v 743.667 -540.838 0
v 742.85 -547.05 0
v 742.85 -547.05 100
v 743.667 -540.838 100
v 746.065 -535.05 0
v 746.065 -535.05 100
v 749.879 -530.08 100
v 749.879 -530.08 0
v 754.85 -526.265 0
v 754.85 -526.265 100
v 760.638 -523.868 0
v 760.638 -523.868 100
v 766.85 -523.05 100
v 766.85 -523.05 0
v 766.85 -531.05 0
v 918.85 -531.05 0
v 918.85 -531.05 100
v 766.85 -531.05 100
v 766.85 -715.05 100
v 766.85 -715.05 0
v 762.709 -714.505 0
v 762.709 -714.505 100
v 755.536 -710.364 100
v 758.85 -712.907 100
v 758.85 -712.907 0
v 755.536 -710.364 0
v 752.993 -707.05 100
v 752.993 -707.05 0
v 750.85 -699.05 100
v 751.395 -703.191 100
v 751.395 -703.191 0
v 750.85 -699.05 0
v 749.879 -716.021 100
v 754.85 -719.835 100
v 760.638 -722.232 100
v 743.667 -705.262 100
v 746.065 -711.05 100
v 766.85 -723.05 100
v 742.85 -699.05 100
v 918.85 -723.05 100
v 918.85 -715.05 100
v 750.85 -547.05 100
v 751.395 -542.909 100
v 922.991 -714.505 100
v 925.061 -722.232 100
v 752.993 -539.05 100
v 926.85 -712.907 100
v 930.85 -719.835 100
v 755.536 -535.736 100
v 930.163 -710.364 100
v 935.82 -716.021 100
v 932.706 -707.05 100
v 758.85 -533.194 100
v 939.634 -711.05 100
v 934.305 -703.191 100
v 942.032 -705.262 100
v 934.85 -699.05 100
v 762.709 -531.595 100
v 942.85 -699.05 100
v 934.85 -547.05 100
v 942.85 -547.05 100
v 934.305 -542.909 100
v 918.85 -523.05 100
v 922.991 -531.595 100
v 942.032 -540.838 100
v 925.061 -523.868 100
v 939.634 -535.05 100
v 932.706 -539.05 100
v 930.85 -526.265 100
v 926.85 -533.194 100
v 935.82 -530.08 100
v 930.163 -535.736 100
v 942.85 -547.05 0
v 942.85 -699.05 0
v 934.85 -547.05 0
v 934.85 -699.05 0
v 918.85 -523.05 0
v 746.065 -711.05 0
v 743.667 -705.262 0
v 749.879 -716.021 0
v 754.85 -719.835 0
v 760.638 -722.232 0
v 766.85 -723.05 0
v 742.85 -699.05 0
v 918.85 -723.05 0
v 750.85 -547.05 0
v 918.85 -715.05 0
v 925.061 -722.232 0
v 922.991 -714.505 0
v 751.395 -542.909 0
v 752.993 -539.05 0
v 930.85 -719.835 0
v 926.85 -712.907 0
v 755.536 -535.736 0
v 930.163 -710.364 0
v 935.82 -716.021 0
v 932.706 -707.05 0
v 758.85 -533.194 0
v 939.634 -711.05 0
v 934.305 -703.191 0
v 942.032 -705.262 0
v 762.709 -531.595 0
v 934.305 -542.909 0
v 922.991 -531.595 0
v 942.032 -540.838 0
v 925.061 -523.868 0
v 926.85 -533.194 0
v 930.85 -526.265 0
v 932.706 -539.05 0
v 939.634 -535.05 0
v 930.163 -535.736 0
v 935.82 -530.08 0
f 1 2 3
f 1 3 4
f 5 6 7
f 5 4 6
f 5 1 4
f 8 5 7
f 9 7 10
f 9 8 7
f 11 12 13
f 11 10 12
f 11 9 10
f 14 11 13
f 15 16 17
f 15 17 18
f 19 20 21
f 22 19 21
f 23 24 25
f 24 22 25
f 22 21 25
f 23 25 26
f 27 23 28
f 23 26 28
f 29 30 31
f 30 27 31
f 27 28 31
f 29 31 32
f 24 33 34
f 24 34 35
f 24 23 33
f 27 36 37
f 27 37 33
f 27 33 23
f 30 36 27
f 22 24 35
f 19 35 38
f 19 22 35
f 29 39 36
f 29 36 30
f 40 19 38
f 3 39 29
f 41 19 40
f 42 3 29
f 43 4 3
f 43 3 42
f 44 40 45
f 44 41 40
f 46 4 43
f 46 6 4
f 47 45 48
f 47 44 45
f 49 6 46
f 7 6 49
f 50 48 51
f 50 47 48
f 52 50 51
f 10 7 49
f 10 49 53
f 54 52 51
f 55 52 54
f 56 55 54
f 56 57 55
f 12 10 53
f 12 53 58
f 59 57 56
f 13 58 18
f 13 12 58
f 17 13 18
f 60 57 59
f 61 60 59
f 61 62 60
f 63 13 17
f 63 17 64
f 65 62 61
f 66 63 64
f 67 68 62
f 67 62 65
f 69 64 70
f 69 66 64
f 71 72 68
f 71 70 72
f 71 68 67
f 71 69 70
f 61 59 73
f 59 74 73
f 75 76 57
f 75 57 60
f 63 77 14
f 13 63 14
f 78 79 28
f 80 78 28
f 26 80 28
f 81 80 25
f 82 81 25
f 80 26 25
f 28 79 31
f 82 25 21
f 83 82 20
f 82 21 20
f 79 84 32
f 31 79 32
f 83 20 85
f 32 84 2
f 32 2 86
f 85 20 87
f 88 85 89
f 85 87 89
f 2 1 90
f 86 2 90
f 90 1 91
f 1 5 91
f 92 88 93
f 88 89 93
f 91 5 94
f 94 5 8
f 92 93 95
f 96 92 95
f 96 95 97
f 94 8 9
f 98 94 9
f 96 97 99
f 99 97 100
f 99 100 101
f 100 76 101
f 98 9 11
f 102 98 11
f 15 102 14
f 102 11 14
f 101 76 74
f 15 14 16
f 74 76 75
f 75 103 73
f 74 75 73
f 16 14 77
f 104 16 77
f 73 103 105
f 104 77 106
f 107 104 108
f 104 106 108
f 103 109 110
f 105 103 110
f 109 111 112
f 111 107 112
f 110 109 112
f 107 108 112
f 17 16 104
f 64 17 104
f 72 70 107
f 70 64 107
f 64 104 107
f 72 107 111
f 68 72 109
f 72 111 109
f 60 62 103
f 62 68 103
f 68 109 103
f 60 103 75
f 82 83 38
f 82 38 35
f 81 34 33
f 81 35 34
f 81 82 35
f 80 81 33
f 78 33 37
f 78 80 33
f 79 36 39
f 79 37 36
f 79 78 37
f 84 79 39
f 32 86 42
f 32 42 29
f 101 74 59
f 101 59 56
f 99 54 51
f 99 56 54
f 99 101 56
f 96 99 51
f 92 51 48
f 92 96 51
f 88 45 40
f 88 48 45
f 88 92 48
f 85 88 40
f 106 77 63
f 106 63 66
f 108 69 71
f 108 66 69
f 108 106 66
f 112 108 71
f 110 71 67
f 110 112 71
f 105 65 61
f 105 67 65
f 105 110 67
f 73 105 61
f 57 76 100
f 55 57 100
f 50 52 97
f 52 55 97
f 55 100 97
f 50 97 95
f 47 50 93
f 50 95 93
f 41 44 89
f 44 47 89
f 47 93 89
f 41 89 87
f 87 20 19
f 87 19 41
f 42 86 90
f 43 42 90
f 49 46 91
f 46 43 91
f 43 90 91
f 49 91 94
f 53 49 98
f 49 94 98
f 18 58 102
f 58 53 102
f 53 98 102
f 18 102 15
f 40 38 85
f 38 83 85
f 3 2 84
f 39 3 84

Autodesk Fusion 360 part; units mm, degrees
sketch "スケッチ1" plane through (0, 0, 0) normal (0, 0, 1) x (1, 0, 0)
  line L0 (942.8497, -699.0501) -> (942.8497, -547.0501)
  line L1 (934.8497, -699.0501) -> (934.8497, -547.0501)
  line L2 (742.8497, -547.0501) -> (742.8497, -699.0501)
  line L3 (750.8497, -547.0501) -> (750.8497, -699.0501)
  line L4 (766.8497, -723.0501) -> (918.8497, -723.0501)
  line L5 (766.8497, -715.0501) -> (918.8497, -715.0501)
  arc A0 (742.8497, -699.0501) -> (766.8497, -723.0501) centre (766.8497, -699.0501) ccw
  arc A1 (750.8497, -699.0501) -> (766.8497, -715.0501) centre (766.8497, -699.0501) ccw
  arc A2 (918.8497, -723.0501) -> (942.8497, -699.0501) centre (918.8497, -699.0501) ccw
  arc A3 (918.8497, -715.0501) -> (934.8497, -699.0501) centre (918.8497, -699.0501) ccw
  line L6 (918.8497, -523.0501) -> (766.8497, -523.0501)
  line L7 (918.8497, -531.0501) -> (766.8497, -531.0501)
  arc A4 (766.8497, -523.0501) -> (742.8497, -547.0501) centre (766.8497, -547.0501) ccw
  arc A5 (766.8497, -531.0501) -> (750.8497, -547.0501) centre (766.8497, -547.0501) ccw
  arc A6 (942.8497, -547.0501) -> (918.8497, -523.0501) centre (918.8497, -547.0501) ccw
  arc A7 (934.8497, -547.0501) -> (918.8497, -531.0501) centre (918.8497, -547.0501) ccw
  point P0 (842.8497, -623.0501)
extrude "押し出し1" add sketch "スケッチ1" along normal blind 100
